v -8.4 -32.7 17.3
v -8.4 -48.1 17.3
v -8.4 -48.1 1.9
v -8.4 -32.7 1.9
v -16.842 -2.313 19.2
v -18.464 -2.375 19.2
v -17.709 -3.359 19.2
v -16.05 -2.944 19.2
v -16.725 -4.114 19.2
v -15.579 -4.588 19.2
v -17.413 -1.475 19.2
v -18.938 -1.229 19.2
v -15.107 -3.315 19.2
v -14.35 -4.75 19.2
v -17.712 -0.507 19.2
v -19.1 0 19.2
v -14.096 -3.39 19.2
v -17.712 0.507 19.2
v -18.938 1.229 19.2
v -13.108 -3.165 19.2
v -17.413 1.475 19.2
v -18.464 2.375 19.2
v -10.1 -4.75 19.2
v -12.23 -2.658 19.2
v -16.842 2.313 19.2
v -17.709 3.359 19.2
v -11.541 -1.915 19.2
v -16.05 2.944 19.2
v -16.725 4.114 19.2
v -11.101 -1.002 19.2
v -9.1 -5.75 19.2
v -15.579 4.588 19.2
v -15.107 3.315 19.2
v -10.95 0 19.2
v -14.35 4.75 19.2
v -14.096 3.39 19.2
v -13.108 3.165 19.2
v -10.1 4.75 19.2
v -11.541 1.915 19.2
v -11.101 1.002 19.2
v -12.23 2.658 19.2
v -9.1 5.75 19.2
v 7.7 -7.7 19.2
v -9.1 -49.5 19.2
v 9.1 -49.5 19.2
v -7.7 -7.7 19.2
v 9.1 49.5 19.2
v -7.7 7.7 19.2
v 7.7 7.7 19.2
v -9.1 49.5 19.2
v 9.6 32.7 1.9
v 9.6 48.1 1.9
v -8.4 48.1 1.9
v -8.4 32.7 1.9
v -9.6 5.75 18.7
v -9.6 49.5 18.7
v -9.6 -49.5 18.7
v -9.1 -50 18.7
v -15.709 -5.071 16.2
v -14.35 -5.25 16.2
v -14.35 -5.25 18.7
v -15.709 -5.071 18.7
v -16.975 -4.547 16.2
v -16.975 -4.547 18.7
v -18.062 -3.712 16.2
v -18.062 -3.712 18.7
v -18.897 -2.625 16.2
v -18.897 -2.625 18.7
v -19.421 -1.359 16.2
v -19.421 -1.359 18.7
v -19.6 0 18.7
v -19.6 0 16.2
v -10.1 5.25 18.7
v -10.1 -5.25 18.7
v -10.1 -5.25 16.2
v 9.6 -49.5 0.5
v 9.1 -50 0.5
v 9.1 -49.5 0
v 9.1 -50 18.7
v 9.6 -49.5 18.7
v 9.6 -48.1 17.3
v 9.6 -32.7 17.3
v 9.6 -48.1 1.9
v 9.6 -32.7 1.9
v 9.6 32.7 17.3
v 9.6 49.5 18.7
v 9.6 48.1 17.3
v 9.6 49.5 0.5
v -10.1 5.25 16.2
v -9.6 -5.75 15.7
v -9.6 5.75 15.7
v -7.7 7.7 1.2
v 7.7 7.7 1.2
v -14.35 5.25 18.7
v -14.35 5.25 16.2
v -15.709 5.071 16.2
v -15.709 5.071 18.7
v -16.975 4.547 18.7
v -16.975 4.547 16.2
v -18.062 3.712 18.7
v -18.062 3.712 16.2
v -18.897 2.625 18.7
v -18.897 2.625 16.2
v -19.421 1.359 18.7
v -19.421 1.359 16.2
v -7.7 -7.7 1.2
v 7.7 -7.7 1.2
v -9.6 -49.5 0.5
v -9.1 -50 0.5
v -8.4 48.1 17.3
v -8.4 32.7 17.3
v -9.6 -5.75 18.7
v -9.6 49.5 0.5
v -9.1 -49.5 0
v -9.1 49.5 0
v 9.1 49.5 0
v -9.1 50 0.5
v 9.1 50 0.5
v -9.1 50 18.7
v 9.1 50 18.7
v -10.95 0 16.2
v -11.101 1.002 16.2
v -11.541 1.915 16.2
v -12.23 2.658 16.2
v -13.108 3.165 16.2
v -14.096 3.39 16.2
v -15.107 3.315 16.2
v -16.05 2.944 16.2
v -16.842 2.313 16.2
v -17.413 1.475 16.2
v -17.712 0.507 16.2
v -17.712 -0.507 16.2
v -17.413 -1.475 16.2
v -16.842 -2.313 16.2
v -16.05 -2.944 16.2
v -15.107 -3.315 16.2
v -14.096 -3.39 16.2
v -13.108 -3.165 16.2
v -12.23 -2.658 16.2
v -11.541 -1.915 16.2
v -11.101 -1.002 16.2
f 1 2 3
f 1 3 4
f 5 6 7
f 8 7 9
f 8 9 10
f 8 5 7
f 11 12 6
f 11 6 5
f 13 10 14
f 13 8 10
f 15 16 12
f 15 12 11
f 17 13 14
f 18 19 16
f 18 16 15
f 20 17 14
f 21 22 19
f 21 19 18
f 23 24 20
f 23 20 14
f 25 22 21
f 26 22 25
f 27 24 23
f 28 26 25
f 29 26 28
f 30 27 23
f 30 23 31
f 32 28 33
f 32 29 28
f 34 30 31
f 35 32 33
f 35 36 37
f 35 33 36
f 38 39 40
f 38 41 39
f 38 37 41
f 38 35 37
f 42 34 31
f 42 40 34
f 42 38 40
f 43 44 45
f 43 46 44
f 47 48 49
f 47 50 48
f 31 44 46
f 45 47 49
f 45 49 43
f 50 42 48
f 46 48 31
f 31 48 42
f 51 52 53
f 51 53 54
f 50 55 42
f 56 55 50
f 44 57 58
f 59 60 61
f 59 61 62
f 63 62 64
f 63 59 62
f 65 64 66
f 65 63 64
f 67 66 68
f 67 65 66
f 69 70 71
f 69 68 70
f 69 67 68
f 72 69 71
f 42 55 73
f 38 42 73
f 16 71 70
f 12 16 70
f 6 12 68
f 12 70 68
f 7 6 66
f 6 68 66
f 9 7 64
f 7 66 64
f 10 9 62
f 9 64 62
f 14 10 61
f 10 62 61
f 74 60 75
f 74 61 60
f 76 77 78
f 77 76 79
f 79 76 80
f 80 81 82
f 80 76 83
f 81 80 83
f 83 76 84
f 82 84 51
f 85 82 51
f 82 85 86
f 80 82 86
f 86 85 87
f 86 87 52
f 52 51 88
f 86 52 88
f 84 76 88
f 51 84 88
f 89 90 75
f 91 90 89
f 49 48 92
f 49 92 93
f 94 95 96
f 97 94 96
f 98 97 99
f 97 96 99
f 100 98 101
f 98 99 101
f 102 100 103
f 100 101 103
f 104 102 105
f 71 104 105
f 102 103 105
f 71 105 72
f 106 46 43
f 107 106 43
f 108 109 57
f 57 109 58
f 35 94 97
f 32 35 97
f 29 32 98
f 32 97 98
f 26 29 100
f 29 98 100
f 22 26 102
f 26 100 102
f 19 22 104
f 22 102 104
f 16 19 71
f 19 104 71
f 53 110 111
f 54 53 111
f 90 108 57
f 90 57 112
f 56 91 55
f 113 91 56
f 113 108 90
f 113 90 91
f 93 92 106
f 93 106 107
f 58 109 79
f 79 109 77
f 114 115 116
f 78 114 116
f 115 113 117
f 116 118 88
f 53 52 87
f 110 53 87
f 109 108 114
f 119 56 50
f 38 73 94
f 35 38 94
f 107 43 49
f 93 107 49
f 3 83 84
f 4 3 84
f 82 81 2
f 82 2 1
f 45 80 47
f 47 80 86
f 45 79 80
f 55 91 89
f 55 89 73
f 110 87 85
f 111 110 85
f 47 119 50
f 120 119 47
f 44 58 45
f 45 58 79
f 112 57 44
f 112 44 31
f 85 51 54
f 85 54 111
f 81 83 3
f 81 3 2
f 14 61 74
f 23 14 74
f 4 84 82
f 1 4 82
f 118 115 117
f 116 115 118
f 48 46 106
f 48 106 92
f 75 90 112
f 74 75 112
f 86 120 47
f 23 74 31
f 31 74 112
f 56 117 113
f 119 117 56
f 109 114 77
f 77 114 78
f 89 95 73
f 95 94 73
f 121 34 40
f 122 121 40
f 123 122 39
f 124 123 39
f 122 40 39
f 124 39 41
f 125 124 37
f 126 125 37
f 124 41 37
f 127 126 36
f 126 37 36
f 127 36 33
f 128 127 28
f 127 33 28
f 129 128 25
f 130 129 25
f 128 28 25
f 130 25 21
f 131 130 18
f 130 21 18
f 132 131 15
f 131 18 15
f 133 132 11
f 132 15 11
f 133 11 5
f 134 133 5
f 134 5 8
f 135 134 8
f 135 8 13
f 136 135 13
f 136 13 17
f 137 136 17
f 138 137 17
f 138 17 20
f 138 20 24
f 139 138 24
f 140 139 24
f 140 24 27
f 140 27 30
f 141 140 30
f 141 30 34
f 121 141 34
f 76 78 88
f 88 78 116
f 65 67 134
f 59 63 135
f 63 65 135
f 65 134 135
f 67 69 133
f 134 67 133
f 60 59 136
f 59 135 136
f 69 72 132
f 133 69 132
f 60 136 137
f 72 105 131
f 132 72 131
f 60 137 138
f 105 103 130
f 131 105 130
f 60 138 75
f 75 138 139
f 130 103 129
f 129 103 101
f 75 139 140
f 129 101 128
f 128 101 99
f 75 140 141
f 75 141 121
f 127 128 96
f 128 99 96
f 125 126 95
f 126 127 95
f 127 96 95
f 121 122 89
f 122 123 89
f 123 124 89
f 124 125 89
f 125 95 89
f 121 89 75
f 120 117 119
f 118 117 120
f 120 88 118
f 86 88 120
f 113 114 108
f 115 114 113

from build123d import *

# Parameters (mm, degrees)
F0_W        = 19.2
F0_H        = 100
F1_DEPTH    = 19.2
F2_W        = 15.4
F2_H        = 15.4
F3_DEPTH    = 18
F4_W        = 20
F4_H        = 10.5
F5_DEPTH    = 3
F6_T1_DEPTH = 29.25
F7_R        = 3.4
F8_DEPTH    = 25
F9_SIZE     = 0.5
F11_W       = 15.4
F11_H       = 15.4
F12_DEPTH   = 18


# Not quite as in the source:
# - a fillet or chamfer that OpenCascade refuses, or shapes differently, is made with other operations: its cross-section is extruded or revolved along the edge and cut away or added
# - a pattern or mirror of a feature is missing from the dataset's text; its kind, count and spacing are read off the source's solid


with BuildPart() as f1:
    # F0 (on Top) → F1 (new body)
    with BuildSketch(Plane.XY):
        Rectangle(F0_W, F0_H)
    extrude(amount=F1_DEPTH)

    # F2 (on face) → F3 (cut)
    with BuildSketch(Plane.YZ.offset(9.6)):
        with Locations((-40.4, 9.6)):
            Rectangle(F2_W, F2_H)
    f3 = extrude(amount=-F3_DEPTH, mode=Mode.SUBTRACT)

    # F3_copies: F3 across plane
    add(f3.mirror(Plane.ZX), mode=Mode.SUBTRACT)

    # F4 (on face) → F5 (join)
    with BuildSketch(Plane.XY.offset(19.2)):
        with Locations((-9.6, 0)):
            Rectangle(F4_W, F4_H)
    extrude(amount=-F5_DEPTH)

    # F6: fillet of radius 5.25 on 2 edges, made by hand

    # F6_s2 → F6_t1 (cut)
    with BuildSketch(Plane.XY.offset(3.075)):
        with BuildLine():
            ThreePointArc((-14.35, 5.25), (-18.0623106012, 3.7123106012), (-19.6, 0))
            Line((-19.6, 0), (-19.6, 5.25))
            Line((-19.6, 5.25), (-14.35, 5.25))
        make_face()
        with BuildLine():
            ThreePointArc((-14.35, -5.25), (-18.0623106012, -3.7123106012), (-19.6, 0))
            Line((-19.6, 0), (-19.6, -5.25))
            Line((-19.6, -5.25), (-14.35, -5.25))
        make_face()
    extrude(amount=F6_T1_DEPTH, mode=Mode.SUBTRACT)

    # F7 (on face) → F8 (cut)
    with BuildSketch(Plane.XY.offset(19.2)):
        with Locations((-14.35, 0)):
            Circle(F7_R)
    extrude(amount=-F8_DEPTH, mode=Mode.SUBTRACT)

    # F9
    f9_edges = [f1.edges().sort_by_distance(p)[0] for p in [
        (-9.6, 0, 0),
        (-9.6, -50, 9.6),
        (-9.6, -27.625, 19.2),
        (-9.6, -5.25, 17.7),
        (-9.6, 0, 16.2),
        (-9.6, 5.25, 17.7),
        (-9.6, 27.625, 19.2),
        (-9.6, 50, 9.6),
        (9.6, -50, 9.6),
        (0, -50, 0),
        (0, -50, 19.2),
        (9.6, 50, 9.6),
        (0, 50, 0),
        (0, 50, 19.2),
        (9.6, 0, 0),
        (9.6, 0, 19.2),
        (-11.975, -5.25, 19.2),
        (-18.062311, -3.712311, 19.2),
        (-18.062311, 3.712311, 19.2),
        (-11.975, 5.25, 19.2),
    ]]
    chamfer(f9_edges, length=F9_SIZE)

    # F11 (on face) → F12 (cut)
    with BuildSketch(Plane.XY.offset(19.2)):
        Rectangle(F11_W, F11_H)
    extrude(amount=-F12_DEPTH, mode=Mode.SUBTRACT)


solid = f1.part
